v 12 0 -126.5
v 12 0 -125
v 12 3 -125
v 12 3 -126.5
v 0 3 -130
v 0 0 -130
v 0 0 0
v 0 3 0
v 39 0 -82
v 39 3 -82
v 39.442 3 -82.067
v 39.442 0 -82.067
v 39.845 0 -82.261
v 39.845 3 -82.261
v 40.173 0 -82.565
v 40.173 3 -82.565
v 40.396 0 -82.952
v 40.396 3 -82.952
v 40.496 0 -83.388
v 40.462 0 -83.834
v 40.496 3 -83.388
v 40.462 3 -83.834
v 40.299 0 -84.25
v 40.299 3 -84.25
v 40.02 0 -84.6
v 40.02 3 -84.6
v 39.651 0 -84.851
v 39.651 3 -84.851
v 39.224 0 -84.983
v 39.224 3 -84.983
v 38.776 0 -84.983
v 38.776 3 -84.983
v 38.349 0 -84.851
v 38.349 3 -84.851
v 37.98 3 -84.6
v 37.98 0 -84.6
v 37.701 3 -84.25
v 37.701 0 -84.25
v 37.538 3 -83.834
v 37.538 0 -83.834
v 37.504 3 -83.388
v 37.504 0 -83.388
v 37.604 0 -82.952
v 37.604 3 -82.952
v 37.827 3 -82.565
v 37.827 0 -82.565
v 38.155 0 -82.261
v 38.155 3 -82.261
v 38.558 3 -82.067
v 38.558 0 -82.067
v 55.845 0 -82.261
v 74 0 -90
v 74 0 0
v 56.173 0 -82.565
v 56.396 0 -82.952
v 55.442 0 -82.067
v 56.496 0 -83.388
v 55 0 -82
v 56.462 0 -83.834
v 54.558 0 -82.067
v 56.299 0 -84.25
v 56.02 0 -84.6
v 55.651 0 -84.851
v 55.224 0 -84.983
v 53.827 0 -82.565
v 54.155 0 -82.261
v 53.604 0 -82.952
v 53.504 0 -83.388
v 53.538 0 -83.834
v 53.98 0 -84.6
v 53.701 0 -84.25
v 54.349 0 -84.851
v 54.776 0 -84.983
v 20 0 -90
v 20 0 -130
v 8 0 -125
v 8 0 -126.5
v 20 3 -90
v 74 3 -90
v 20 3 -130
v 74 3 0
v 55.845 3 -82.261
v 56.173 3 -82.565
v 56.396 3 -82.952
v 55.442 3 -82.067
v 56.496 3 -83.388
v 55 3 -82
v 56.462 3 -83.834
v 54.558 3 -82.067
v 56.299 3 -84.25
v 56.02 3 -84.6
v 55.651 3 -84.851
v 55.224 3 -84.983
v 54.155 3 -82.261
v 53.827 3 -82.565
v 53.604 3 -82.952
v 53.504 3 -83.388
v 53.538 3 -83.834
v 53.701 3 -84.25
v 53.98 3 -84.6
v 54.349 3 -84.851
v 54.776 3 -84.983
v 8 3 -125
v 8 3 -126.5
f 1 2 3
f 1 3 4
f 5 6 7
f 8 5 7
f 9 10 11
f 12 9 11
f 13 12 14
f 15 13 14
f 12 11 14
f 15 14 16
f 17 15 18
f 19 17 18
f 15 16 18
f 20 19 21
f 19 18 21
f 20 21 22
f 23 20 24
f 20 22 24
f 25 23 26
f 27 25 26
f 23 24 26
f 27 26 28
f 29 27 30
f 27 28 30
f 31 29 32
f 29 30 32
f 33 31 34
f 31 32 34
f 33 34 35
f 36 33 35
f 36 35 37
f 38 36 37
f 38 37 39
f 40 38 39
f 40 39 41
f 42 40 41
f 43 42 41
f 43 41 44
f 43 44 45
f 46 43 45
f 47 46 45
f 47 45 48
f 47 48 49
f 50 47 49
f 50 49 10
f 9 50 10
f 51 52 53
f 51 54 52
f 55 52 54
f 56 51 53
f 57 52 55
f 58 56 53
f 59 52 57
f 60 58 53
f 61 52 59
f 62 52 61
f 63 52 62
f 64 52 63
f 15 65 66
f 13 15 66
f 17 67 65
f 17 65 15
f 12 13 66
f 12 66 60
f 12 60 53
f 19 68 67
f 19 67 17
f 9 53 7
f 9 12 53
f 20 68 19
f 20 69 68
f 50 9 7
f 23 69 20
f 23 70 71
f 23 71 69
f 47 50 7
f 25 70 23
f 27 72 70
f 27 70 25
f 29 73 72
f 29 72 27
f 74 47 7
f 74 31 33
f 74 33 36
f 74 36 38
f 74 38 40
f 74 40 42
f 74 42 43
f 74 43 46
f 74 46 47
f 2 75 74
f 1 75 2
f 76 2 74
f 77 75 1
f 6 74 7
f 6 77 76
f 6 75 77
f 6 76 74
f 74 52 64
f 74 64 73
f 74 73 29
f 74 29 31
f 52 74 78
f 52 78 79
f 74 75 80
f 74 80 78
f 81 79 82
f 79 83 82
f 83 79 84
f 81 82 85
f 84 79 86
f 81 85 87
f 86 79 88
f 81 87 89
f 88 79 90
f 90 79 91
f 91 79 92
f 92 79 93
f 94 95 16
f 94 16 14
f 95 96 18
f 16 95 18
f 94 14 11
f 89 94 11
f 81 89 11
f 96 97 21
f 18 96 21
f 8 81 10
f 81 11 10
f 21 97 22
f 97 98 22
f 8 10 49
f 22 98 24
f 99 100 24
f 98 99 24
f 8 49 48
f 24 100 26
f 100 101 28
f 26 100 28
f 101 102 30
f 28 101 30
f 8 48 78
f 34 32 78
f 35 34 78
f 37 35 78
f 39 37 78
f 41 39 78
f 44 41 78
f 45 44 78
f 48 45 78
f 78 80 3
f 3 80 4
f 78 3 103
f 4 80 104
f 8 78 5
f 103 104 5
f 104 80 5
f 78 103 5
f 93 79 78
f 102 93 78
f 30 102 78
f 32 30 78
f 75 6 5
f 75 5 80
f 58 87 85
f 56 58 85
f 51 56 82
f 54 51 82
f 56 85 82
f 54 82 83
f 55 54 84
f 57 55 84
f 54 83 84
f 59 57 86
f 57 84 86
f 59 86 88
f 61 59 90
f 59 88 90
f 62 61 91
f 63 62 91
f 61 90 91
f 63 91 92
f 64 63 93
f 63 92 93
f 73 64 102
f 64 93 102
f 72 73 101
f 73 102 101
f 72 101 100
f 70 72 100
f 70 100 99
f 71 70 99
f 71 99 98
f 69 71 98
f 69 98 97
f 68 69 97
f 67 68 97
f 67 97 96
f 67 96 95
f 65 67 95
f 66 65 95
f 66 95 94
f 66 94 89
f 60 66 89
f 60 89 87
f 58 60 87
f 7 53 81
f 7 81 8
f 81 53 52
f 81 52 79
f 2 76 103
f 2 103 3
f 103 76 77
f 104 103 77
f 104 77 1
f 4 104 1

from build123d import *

# Parameters (mm, degrees)
SKETCH1_W           = 4
SKETCH1_H           = 1.5
BOSS_EXTRUDE1_DEPTH = 3
SKETCH4_W           = 15
SKETCH4_H           = 3
CUT_EXTRUDE3_DEPTH  = 158.575378787
SKETCH7_R           = 1.5
CUT_EXTRUDE6_DEPTH  = 10


with BuildPart() as part:
    # Sketch1 → Boss-Extrude1 (new body)
    with BuildSketch(Plane(origin=(0, 0, 0), x_dir=(1, 0, 0), z_dir=(0, 1, 0))):
        Polygon((0, 90), (0, 130), (20, 130), (20, 90), (89, 90), (89, 0), (0, 0), align=None)
        with Locations((10, 125.75)):
            Rectangle(SKETCH1_W, SKETCH1_H, mode=Mode.SUBTRACT)
    extrude(amount=BOSS_EXTRUDE1_DEPTH)

    # Sketch4 → Cut-Extrude3 (cut, through all)
    with BuildSketch(Plane.XY):
        with Locations((81.5, 1.5)):
            Rectangle(SKETCH4_W, SKETCH4_H)
    extrude(amount=-CUT_EXTRUDE3_DEPTH, mode=Mode.SUBTRACT)

    # Sketch7 → Cut-Extrude6 (cut)
    with BuildSketch(Plane(origin=(0, 3, 0), x_dir=(1, 0, 0), z_dir=(0, 1, 0))):
        with Locations(Location((39, 83.5, 0), (0, 0, 270))):
            Circle(SKETCH7_R)
        with Locations(Location((55, 83.5, 0), (0, 0, 270))):
            Circle(SKETCH7_R)
    extrude(amount=-CUT_EXTRUDE6_DEPTH, mode=Mode.SUBTRACT)


solid = part.part
